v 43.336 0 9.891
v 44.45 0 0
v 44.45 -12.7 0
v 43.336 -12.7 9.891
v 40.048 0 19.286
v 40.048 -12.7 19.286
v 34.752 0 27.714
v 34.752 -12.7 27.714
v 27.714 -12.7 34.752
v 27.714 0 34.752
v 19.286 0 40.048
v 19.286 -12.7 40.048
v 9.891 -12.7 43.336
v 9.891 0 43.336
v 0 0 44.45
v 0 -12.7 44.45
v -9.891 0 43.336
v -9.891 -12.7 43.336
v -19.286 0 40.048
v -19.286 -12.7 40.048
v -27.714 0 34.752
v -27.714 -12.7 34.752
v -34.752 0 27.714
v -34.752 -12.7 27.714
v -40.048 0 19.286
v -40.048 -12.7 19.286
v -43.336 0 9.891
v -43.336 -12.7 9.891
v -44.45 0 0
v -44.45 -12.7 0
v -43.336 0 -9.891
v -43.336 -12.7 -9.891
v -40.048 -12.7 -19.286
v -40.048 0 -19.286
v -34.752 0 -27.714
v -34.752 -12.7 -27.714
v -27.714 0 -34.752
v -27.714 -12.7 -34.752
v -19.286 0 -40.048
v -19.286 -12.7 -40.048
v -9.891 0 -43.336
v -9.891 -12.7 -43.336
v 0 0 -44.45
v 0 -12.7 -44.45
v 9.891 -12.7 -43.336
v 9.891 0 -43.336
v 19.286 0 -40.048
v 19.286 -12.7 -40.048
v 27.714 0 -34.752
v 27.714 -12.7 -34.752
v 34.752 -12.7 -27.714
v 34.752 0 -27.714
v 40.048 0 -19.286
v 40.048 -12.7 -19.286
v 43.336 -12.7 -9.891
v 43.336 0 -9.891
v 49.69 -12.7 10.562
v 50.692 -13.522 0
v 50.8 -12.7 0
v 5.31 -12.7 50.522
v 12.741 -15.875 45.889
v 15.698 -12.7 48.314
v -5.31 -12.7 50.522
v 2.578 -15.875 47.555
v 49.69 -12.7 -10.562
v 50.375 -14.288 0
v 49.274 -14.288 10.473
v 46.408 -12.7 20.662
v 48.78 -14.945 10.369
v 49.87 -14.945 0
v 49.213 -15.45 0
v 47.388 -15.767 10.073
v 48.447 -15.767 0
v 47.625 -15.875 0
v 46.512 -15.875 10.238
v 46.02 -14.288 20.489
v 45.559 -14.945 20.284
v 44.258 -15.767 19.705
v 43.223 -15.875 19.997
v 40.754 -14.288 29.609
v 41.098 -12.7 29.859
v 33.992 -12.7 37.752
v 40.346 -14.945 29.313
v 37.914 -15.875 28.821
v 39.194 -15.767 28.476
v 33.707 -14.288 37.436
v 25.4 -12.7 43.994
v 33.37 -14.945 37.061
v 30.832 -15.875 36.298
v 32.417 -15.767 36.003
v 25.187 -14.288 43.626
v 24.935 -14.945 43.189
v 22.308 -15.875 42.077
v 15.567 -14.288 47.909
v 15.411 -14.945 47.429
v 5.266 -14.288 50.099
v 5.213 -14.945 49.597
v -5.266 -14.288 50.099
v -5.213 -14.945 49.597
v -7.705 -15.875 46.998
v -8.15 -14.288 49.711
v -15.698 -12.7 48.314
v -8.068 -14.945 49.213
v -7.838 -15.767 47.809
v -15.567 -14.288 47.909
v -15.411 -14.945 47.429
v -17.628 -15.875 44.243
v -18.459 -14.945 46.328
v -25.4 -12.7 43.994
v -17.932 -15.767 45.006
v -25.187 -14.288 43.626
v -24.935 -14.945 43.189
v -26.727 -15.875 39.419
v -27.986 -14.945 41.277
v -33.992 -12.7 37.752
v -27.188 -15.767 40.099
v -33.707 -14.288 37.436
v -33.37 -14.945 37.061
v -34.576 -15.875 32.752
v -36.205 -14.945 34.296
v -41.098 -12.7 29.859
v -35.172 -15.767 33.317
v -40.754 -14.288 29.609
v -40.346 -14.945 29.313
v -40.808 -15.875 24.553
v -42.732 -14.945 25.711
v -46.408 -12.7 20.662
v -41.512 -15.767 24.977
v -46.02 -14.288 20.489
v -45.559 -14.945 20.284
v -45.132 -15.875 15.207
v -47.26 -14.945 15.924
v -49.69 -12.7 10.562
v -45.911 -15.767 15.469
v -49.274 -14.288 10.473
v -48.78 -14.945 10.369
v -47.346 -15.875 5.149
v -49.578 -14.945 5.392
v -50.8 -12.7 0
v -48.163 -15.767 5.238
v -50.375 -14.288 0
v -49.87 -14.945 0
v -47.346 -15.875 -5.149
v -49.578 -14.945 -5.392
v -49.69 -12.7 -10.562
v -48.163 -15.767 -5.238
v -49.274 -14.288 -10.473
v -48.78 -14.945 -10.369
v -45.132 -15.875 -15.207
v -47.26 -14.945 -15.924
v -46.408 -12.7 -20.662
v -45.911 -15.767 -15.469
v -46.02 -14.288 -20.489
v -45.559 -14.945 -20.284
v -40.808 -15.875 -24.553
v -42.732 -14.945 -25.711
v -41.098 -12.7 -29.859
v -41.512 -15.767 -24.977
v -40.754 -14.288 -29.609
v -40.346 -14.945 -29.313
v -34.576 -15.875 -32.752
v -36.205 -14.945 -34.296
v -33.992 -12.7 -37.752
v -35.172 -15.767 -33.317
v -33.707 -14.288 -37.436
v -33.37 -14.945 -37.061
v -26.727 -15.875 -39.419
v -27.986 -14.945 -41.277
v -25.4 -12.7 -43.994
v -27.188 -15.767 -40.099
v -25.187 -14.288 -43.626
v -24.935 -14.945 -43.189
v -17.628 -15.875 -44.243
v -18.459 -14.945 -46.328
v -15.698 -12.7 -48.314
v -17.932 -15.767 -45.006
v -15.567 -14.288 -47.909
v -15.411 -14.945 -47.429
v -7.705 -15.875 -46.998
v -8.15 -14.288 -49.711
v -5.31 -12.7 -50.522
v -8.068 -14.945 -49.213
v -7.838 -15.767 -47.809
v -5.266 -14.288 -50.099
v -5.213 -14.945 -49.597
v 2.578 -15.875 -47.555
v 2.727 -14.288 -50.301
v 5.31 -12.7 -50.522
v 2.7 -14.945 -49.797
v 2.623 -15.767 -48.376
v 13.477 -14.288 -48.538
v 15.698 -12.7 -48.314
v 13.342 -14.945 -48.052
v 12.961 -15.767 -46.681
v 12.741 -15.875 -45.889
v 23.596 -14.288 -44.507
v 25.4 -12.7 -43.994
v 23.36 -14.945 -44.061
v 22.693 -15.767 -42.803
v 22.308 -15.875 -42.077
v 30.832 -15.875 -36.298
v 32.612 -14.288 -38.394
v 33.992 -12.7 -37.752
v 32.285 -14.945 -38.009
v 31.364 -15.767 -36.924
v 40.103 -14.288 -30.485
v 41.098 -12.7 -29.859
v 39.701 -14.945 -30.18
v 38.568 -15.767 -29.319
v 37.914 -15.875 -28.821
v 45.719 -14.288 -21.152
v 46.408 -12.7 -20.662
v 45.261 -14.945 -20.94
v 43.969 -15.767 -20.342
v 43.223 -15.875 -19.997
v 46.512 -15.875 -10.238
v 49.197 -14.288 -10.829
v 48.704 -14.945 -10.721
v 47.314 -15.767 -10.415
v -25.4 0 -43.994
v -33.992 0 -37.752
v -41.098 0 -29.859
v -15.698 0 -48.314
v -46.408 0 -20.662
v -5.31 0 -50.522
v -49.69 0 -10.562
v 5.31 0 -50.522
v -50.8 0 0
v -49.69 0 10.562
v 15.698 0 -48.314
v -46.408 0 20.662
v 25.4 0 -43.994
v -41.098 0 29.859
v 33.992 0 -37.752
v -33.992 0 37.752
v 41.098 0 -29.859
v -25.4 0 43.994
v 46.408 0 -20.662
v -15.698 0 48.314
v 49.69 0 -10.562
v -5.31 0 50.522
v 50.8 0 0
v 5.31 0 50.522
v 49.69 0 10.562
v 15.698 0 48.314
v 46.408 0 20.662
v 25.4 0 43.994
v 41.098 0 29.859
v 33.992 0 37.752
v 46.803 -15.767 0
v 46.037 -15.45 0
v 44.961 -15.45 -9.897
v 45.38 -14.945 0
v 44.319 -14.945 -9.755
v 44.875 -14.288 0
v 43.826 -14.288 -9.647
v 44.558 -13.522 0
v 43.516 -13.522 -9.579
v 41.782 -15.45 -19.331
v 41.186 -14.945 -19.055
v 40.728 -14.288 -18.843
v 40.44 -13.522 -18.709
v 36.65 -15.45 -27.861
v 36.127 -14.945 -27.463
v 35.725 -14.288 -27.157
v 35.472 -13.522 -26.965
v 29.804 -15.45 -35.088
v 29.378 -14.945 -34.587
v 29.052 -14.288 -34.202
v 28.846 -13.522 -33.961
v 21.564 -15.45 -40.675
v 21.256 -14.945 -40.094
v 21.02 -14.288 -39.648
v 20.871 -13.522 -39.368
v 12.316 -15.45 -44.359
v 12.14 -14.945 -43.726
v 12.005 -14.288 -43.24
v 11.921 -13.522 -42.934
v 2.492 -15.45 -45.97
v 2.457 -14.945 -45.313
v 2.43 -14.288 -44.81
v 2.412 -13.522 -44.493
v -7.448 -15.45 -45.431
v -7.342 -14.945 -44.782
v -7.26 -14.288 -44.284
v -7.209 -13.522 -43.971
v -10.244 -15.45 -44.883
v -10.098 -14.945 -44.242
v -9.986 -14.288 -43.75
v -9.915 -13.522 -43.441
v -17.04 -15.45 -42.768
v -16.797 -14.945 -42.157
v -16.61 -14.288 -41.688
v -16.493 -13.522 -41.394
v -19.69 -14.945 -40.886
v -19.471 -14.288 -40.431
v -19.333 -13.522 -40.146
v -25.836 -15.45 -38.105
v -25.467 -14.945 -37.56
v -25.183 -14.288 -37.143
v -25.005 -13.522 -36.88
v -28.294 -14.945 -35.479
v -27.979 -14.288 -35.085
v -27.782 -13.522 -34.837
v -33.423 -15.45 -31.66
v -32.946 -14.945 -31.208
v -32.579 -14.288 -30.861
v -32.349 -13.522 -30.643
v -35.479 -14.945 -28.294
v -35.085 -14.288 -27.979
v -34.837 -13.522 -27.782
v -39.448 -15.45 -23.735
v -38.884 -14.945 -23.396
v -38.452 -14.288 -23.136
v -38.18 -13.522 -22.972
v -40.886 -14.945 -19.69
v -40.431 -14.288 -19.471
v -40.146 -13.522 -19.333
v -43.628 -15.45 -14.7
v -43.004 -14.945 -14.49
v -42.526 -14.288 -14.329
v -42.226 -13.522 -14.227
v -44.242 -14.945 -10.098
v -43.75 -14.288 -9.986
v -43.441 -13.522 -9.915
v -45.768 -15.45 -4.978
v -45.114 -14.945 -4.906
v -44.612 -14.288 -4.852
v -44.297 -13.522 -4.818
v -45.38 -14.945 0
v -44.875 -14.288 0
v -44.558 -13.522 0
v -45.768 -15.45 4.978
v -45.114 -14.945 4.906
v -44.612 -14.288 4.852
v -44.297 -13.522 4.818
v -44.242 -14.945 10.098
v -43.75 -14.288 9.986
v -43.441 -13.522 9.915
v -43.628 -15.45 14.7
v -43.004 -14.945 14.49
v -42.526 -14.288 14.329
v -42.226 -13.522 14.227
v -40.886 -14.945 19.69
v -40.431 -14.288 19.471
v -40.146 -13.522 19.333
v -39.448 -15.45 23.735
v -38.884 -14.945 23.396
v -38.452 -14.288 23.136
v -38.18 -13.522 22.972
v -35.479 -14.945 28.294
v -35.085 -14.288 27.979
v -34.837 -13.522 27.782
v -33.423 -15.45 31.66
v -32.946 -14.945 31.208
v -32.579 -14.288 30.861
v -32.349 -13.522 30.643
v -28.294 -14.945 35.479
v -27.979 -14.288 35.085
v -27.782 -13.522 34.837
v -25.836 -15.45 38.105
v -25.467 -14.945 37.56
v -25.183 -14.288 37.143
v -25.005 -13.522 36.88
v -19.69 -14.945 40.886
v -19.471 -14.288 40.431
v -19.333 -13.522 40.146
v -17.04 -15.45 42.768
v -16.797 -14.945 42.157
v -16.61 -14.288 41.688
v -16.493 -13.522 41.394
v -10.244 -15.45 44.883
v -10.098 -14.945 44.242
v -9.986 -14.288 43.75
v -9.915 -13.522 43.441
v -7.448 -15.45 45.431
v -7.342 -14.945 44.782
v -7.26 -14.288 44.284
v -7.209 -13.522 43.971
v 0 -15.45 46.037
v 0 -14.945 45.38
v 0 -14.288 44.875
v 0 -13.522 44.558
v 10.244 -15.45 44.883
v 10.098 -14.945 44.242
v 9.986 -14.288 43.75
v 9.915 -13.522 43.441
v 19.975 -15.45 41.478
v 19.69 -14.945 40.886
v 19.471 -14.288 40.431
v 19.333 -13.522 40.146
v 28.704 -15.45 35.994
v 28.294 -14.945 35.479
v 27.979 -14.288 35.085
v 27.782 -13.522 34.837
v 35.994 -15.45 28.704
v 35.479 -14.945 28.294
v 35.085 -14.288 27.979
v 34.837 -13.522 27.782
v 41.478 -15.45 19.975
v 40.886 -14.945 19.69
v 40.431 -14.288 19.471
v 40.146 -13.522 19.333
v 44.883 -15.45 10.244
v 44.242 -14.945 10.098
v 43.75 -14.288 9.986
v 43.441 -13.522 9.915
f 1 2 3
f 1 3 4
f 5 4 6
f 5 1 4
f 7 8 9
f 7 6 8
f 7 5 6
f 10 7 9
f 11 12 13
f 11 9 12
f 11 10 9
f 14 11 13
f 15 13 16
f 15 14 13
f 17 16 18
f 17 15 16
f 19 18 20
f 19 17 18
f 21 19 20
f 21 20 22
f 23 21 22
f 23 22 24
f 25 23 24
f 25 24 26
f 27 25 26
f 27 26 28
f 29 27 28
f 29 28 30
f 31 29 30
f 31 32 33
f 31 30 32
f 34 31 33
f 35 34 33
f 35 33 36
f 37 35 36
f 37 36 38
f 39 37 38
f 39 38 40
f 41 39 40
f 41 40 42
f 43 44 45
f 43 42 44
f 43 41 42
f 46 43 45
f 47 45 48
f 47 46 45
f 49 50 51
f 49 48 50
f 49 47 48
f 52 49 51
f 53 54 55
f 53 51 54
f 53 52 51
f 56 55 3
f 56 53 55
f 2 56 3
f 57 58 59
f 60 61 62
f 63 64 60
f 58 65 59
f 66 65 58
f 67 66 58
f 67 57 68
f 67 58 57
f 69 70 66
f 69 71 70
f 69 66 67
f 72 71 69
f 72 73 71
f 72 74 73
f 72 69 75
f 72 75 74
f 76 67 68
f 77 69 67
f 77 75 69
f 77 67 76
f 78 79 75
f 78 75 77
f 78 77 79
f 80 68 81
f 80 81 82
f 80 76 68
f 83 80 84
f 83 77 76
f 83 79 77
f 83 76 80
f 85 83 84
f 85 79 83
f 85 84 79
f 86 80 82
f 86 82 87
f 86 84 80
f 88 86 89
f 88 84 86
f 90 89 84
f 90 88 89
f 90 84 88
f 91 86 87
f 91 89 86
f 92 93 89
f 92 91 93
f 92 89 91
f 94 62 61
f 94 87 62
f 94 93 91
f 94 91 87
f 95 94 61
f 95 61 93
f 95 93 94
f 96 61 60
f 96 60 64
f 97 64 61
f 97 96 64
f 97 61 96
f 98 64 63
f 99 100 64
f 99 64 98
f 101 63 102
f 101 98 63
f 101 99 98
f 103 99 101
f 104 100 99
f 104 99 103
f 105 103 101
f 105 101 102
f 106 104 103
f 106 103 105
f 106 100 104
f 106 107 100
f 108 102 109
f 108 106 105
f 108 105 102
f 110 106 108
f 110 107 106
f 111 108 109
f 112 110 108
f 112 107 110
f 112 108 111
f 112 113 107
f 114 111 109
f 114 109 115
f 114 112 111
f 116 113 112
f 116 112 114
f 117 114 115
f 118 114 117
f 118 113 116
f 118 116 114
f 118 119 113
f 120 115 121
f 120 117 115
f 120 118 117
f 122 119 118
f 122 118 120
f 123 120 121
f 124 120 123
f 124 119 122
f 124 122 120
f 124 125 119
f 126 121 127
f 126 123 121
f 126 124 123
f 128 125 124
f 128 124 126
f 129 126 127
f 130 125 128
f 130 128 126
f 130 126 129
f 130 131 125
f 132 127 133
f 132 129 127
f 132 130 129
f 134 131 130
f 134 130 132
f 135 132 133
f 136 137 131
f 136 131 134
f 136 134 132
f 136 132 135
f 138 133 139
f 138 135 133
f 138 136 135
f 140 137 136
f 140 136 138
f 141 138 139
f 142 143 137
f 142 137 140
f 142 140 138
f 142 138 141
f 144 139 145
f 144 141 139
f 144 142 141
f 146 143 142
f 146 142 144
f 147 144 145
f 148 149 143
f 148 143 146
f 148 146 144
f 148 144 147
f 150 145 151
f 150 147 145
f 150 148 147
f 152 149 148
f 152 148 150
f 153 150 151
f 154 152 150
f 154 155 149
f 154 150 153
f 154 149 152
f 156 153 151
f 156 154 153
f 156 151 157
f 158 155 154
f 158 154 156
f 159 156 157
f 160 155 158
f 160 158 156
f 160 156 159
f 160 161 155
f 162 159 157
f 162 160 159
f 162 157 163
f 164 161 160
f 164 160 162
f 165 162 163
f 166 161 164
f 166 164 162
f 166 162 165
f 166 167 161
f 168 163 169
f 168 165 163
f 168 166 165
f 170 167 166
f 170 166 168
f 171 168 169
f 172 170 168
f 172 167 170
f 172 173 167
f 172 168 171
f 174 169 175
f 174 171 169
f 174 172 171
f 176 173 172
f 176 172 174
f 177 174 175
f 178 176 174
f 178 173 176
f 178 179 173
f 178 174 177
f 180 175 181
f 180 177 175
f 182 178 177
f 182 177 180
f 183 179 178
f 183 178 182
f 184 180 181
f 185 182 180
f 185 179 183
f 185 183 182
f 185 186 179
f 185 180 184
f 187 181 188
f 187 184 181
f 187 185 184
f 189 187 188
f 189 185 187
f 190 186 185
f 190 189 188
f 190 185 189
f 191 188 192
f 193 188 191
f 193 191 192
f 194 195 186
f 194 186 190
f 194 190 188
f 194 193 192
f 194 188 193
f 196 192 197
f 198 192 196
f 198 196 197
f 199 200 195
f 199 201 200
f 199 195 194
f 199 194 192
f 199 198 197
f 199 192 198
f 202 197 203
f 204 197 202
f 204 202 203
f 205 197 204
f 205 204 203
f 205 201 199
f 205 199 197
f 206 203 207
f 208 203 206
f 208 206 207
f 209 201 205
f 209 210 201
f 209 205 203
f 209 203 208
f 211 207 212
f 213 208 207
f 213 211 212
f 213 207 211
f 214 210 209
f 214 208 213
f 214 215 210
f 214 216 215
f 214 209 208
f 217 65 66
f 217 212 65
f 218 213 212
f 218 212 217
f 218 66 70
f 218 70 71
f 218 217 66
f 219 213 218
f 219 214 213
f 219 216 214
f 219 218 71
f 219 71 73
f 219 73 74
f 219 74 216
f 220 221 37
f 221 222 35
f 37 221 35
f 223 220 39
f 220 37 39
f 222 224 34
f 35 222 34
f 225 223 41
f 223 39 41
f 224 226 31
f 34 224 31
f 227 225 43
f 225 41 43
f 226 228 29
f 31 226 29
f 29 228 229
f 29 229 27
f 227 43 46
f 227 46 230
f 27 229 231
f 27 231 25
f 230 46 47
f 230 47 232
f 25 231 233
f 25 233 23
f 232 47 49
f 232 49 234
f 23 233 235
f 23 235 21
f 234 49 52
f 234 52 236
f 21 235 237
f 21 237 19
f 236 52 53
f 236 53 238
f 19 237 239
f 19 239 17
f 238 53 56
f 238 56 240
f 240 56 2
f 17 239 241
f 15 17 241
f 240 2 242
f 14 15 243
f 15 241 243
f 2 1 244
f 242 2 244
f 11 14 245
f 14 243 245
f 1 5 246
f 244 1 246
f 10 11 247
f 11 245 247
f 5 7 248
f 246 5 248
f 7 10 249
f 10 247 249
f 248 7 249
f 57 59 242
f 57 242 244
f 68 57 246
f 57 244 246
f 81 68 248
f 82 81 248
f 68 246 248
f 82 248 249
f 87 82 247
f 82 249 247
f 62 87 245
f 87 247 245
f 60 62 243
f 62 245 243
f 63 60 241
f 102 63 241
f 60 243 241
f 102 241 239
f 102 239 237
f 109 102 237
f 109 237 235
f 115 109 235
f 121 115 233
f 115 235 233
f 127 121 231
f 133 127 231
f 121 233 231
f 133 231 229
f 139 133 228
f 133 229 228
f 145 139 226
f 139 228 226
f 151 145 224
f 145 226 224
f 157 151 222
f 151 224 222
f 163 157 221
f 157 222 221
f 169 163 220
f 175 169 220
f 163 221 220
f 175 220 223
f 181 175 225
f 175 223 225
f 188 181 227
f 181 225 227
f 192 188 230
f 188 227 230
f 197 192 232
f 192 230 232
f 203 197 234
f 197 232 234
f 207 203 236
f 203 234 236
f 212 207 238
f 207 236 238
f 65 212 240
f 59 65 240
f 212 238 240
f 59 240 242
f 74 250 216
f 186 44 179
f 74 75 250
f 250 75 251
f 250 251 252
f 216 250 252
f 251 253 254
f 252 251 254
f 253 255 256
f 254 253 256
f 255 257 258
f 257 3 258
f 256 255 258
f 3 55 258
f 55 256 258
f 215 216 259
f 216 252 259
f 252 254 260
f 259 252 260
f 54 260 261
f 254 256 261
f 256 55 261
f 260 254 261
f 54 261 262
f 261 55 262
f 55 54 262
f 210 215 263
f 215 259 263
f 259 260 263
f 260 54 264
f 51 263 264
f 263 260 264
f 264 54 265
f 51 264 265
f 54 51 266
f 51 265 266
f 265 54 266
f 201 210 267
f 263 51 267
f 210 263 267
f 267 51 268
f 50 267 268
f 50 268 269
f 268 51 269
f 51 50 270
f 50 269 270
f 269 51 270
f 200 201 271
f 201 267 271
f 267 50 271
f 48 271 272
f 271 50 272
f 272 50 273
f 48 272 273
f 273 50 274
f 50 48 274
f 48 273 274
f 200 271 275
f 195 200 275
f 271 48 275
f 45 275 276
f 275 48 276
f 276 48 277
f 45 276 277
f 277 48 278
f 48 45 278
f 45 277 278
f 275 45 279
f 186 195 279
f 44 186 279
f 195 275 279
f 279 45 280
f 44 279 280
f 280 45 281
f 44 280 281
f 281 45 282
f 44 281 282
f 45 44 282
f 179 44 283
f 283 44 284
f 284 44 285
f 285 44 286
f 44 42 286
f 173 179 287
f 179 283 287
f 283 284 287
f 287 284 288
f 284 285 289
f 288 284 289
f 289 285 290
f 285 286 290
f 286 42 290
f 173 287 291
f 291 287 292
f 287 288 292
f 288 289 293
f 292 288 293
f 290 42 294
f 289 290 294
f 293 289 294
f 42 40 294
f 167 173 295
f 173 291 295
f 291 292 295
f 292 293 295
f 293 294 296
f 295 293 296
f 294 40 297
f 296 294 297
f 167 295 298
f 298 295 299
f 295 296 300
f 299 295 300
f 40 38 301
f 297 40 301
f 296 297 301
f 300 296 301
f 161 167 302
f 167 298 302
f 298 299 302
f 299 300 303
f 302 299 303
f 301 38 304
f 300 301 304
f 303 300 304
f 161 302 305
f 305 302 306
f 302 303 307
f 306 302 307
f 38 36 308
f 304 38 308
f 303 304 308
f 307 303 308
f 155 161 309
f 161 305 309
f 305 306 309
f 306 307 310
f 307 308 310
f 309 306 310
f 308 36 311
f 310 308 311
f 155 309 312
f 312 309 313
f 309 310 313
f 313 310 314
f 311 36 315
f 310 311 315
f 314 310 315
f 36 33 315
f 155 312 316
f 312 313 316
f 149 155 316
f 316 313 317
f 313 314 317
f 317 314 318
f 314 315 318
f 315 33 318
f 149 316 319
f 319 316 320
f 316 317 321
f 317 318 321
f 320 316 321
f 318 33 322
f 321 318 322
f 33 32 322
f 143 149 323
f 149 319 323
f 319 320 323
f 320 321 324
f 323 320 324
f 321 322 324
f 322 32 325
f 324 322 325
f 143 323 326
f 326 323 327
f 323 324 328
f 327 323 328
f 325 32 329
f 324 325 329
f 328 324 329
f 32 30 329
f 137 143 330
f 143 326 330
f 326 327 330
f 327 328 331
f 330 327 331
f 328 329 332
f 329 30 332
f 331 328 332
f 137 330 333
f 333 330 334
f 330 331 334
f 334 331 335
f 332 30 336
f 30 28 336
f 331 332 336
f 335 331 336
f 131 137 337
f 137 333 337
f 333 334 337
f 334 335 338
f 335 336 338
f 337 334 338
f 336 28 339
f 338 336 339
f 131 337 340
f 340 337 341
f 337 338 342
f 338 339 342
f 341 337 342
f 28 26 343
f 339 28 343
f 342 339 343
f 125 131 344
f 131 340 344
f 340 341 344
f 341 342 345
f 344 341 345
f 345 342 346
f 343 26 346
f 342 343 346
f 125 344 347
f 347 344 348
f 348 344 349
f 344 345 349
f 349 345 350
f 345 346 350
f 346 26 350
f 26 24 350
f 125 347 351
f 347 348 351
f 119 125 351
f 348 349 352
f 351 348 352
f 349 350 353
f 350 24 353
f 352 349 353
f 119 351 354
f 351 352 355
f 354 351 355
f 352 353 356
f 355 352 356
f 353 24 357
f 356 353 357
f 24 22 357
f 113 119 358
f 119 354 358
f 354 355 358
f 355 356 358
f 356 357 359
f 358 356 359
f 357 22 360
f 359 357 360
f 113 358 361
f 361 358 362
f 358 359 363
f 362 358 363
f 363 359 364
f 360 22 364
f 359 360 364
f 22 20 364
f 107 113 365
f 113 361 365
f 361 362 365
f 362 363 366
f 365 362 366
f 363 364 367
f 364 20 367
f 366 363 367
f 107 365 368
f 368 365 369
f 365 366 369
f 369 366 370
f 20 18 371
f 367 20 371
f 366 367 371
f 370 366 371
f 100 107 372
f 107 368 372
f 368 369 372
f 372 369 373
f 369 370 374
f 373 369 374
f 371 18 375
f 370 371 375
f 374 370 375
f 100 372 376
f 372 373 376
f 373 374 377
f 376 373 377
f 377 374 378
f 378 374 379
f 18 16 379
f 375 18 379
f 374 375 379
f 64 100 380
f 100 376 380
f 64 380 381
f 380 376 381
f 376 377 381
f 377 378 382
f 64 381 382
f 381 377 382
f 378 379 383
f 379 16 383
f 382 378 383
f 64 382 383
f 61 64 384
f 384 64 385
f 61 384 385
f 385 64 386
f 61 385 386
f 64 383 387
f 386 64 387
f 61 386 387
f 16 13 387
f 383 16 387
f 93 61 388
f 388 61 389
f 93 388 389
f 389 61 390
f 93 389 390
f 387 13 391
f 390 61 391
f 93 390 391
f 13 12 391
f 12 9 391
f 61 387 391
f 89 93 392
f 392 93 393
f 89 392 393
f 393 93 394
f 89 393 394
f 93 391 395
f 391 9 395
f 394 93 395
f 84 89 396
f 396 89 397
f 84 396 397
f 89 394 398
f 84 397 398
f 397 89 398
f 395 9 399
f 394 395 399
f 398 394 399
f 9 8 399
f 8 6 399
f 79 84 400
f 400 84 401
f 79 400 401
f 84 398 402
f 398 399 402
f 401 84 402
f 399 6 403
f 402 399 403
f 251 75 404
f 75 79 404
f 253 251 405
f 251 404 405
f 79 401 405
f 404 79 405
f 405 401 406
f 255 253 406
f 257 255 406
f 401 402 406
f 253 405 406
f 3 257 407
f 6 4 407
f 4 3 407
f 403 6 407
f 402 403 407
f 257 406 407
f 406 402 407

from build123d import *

# Parameters (mm, degrees)
F0_R     = 50.8
F1_DEPTH = 15.875
F2_R     = 44.45
F3_DEPTH = 15.876
F4_R     = 3.17499


# Not quite as in the source:
# - a fillet or chamfer is up to 0.001 mm smaller than in the source, because OpenCascade refuses the exact size


with BuildPart() as f1:
    # F0 (on Front) → F1 (new body)
    with BuildSketch(Plane.XZ):
        Circle(F0_R)
    extrude(amount=F1_DEPTH)

    # F2 (on Front) → F3 (cut, through all)
    with BuildSketch(Plane.XZ):
        Circle(F2_R)
    extrude(amount=F3_DEPTH, mode=Mode.SUBTRACT)

    # F4 (radius 3.175 in the source; OpenCascade refuses exactly that, so slightly less here)
    f4_edges = [f1.edges().sort_by_distance(p)[0] for p in [
        (-50.8, -15.875, 0),
        (-44.45, -15.875, 0),
    ]]
    fillet(f4_edges, radius=F4_R)


solid = f1.part
